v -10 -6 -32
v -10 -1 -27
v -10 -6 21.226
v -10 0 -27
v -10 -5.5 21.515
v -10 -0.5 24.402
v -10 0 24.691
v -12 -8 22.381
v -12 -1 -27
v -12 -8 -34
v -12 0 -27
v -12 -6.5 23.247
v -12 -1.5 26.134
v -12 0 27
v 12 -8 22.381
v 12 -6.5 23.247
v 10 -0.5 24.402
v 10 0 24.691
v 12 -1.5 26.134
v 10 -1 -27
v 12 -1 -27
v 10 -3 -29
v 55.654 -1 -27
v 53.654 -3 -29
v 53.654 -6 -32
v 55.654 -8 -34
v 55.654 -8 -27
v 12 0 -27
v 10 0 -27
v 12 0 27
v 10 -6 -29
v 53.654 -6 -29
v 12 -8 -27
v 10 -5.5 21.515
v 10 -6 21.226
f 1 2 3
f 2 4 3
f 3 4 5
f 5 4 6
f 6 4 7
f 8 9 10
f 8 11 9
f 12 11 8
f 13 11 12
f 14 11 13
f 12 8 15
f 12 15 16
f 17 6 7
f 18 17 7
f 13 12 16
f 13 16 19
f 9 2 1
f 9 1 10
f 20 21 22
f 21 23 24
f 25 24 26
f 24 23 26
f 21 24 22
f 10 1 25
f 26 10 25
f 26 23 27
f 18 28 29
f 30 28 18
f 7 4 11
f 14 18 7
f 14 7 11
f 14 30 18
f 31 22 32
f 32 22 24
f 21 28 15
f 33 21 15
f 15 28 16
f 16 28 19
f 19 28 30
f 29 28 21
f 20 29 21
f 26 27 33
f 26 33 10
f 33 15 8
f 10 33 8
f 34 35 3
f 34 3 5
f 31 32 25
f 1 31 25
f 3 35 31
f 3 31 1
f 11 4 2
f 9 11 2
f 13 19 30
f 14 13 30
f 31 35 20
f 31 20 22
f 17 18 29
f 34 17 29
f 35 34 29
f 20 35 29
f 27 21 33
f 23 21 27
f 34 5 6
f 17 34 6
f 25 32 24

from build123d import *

# Parameters (mm, degrees)
F0_W      = 20
F0_H      = 50
F0_H_2    = 2
F1_DEPTH  = 8
F3_DEPTH  = 50
F4_DEPTH  = 25.4
F5_T      = -2
F6_W      = 2
F6_H      = 5
F6_H_2    = 2
F6_W_2    = 20
F6_W_3    = 43.6544959545
F6_H_3    = 1
F6_H_4    = 3
F7_DEPTH  = 8
F9_DEPTH  = 76.2
F10_DEPTH = 6


with BuildPart() as f1:
    # F0 (on Front) → F1 (new body)
    with BuildSketch(Plane.XZ):
        Polygon((12, 27), (-12, 27), (-12, -27), (-10, -27), (-10, -25), (-10, 25), (10, 25), (10, -25), (10, -27), (12, -27), align=None)
        Rectangle(F0_W, F0_H)
        with Locations((0, -26)):
            Rectangle(F0_W, F0_H_2)
    extrude(amount=F1_DEPTH)

    # F2 (on Right) → F3 (cut)
    with BuildSketch(Plane.YZ):
        Polygon((-6.5, 23.2472232503), (-1.5, 26.1339745962), (0, 27), (-8, 27), (-8, 22.3811978465), align=None)
    extrude(amount=-F3_DEPTH, mode=Mode.SUBTRACT)

    # F2 (on Right) → F4 (cut)
    with BuildSketch(Plane.YZ):
        Polygon((-6.5, 23.2472232503), (-1.5, 26.1339745962), (0, 27), (-8, 27), (-8, 22.3811978465), align=None)
    extrude(amount=F4_DEPTH, mode=Mode.SUBTRACT)

    # F5
    f5_openings = [f1.faces().sort_by_distance(p)[0] for p in [
        (0, 0, 0),
        (0, -4, -27),
    ]]
    offset(amount=F5_T, openings=f5_openings)

    # F6 (on face) → F7 (join)
    with BuildSketch(Plane(origin=(0, 0, 0), x_dir=(-1, 0, 0), z_dir=(0, 1, 0))):
        with Locations((11, -29.5)):
            Rectangle(F6_W, F6_H)
        with Locations((11, -33)):
            Rectangle(F6_W, F6_H_2)
        with Locations((0, -33)):
            Rectangle(F6_W_2, F6_H_2)
        with Locations((-31.8272479773, -33)):
            Rectangle(F6_W_3, F6_H_2)
        Polygon((-10, -28), (-10, -27), (-12, -27), (-53.6544959545, -27), (-53.6544959545, -28), align=None)
        with Locations((-54.6544959545, -27.5)):
            Rectangle(F6_W, F6_H_3)
        with Locations((-54.6544959545, -30.5)):
            Rectangle(F6_W, F6_H_4)
        with Locations((-54.6544959545, -33)):
            Rectangle(F6_W, F6_H_2)
        Polygon((10, -32), (10, -27), (-10, -27), (-10, -28), (-10, -29), (-53.6544959545, -29), (-53.6544959545, -32), (-10, -32), align=None)
        with Locations((-31.8272479773, -28.5)):
            Rectangle(F6_W_3, F6_H_3)
        with Locations((-54.6544959545, -28.5)):
            Rectangle(F6_W, F6_H_3)
    extrude(amount=-F7_DEPTH)

    # F8 (on face) → F9 (cut)
    with BuildSketch(Plane.YZ.offset(55.6544959545)):
        Polygon((-1, -27), (-8, -34), (0, -34), (0, -27), align=None)
    extrude(amount=-F9_DEPTH, mode=Mode.SUBTRACT)

    # F6 (on face) → F10 (cut)
    with BuildSketch(Plane(origin=(0, 0, 0), x_dir=(-1, 0, 0), z_dir=(0, 1, 0))):
        Polygon((10, -32), (10, -27), (-10, -27), (-10, -28), (-10, -29), (-53.6544959545, -29), (-53.6544959545, -32), (-10, -32), align=None)
    extrude(amount=-F10_DEPTH, mode=Mode.SUBTRACT)


solid = f1.part
